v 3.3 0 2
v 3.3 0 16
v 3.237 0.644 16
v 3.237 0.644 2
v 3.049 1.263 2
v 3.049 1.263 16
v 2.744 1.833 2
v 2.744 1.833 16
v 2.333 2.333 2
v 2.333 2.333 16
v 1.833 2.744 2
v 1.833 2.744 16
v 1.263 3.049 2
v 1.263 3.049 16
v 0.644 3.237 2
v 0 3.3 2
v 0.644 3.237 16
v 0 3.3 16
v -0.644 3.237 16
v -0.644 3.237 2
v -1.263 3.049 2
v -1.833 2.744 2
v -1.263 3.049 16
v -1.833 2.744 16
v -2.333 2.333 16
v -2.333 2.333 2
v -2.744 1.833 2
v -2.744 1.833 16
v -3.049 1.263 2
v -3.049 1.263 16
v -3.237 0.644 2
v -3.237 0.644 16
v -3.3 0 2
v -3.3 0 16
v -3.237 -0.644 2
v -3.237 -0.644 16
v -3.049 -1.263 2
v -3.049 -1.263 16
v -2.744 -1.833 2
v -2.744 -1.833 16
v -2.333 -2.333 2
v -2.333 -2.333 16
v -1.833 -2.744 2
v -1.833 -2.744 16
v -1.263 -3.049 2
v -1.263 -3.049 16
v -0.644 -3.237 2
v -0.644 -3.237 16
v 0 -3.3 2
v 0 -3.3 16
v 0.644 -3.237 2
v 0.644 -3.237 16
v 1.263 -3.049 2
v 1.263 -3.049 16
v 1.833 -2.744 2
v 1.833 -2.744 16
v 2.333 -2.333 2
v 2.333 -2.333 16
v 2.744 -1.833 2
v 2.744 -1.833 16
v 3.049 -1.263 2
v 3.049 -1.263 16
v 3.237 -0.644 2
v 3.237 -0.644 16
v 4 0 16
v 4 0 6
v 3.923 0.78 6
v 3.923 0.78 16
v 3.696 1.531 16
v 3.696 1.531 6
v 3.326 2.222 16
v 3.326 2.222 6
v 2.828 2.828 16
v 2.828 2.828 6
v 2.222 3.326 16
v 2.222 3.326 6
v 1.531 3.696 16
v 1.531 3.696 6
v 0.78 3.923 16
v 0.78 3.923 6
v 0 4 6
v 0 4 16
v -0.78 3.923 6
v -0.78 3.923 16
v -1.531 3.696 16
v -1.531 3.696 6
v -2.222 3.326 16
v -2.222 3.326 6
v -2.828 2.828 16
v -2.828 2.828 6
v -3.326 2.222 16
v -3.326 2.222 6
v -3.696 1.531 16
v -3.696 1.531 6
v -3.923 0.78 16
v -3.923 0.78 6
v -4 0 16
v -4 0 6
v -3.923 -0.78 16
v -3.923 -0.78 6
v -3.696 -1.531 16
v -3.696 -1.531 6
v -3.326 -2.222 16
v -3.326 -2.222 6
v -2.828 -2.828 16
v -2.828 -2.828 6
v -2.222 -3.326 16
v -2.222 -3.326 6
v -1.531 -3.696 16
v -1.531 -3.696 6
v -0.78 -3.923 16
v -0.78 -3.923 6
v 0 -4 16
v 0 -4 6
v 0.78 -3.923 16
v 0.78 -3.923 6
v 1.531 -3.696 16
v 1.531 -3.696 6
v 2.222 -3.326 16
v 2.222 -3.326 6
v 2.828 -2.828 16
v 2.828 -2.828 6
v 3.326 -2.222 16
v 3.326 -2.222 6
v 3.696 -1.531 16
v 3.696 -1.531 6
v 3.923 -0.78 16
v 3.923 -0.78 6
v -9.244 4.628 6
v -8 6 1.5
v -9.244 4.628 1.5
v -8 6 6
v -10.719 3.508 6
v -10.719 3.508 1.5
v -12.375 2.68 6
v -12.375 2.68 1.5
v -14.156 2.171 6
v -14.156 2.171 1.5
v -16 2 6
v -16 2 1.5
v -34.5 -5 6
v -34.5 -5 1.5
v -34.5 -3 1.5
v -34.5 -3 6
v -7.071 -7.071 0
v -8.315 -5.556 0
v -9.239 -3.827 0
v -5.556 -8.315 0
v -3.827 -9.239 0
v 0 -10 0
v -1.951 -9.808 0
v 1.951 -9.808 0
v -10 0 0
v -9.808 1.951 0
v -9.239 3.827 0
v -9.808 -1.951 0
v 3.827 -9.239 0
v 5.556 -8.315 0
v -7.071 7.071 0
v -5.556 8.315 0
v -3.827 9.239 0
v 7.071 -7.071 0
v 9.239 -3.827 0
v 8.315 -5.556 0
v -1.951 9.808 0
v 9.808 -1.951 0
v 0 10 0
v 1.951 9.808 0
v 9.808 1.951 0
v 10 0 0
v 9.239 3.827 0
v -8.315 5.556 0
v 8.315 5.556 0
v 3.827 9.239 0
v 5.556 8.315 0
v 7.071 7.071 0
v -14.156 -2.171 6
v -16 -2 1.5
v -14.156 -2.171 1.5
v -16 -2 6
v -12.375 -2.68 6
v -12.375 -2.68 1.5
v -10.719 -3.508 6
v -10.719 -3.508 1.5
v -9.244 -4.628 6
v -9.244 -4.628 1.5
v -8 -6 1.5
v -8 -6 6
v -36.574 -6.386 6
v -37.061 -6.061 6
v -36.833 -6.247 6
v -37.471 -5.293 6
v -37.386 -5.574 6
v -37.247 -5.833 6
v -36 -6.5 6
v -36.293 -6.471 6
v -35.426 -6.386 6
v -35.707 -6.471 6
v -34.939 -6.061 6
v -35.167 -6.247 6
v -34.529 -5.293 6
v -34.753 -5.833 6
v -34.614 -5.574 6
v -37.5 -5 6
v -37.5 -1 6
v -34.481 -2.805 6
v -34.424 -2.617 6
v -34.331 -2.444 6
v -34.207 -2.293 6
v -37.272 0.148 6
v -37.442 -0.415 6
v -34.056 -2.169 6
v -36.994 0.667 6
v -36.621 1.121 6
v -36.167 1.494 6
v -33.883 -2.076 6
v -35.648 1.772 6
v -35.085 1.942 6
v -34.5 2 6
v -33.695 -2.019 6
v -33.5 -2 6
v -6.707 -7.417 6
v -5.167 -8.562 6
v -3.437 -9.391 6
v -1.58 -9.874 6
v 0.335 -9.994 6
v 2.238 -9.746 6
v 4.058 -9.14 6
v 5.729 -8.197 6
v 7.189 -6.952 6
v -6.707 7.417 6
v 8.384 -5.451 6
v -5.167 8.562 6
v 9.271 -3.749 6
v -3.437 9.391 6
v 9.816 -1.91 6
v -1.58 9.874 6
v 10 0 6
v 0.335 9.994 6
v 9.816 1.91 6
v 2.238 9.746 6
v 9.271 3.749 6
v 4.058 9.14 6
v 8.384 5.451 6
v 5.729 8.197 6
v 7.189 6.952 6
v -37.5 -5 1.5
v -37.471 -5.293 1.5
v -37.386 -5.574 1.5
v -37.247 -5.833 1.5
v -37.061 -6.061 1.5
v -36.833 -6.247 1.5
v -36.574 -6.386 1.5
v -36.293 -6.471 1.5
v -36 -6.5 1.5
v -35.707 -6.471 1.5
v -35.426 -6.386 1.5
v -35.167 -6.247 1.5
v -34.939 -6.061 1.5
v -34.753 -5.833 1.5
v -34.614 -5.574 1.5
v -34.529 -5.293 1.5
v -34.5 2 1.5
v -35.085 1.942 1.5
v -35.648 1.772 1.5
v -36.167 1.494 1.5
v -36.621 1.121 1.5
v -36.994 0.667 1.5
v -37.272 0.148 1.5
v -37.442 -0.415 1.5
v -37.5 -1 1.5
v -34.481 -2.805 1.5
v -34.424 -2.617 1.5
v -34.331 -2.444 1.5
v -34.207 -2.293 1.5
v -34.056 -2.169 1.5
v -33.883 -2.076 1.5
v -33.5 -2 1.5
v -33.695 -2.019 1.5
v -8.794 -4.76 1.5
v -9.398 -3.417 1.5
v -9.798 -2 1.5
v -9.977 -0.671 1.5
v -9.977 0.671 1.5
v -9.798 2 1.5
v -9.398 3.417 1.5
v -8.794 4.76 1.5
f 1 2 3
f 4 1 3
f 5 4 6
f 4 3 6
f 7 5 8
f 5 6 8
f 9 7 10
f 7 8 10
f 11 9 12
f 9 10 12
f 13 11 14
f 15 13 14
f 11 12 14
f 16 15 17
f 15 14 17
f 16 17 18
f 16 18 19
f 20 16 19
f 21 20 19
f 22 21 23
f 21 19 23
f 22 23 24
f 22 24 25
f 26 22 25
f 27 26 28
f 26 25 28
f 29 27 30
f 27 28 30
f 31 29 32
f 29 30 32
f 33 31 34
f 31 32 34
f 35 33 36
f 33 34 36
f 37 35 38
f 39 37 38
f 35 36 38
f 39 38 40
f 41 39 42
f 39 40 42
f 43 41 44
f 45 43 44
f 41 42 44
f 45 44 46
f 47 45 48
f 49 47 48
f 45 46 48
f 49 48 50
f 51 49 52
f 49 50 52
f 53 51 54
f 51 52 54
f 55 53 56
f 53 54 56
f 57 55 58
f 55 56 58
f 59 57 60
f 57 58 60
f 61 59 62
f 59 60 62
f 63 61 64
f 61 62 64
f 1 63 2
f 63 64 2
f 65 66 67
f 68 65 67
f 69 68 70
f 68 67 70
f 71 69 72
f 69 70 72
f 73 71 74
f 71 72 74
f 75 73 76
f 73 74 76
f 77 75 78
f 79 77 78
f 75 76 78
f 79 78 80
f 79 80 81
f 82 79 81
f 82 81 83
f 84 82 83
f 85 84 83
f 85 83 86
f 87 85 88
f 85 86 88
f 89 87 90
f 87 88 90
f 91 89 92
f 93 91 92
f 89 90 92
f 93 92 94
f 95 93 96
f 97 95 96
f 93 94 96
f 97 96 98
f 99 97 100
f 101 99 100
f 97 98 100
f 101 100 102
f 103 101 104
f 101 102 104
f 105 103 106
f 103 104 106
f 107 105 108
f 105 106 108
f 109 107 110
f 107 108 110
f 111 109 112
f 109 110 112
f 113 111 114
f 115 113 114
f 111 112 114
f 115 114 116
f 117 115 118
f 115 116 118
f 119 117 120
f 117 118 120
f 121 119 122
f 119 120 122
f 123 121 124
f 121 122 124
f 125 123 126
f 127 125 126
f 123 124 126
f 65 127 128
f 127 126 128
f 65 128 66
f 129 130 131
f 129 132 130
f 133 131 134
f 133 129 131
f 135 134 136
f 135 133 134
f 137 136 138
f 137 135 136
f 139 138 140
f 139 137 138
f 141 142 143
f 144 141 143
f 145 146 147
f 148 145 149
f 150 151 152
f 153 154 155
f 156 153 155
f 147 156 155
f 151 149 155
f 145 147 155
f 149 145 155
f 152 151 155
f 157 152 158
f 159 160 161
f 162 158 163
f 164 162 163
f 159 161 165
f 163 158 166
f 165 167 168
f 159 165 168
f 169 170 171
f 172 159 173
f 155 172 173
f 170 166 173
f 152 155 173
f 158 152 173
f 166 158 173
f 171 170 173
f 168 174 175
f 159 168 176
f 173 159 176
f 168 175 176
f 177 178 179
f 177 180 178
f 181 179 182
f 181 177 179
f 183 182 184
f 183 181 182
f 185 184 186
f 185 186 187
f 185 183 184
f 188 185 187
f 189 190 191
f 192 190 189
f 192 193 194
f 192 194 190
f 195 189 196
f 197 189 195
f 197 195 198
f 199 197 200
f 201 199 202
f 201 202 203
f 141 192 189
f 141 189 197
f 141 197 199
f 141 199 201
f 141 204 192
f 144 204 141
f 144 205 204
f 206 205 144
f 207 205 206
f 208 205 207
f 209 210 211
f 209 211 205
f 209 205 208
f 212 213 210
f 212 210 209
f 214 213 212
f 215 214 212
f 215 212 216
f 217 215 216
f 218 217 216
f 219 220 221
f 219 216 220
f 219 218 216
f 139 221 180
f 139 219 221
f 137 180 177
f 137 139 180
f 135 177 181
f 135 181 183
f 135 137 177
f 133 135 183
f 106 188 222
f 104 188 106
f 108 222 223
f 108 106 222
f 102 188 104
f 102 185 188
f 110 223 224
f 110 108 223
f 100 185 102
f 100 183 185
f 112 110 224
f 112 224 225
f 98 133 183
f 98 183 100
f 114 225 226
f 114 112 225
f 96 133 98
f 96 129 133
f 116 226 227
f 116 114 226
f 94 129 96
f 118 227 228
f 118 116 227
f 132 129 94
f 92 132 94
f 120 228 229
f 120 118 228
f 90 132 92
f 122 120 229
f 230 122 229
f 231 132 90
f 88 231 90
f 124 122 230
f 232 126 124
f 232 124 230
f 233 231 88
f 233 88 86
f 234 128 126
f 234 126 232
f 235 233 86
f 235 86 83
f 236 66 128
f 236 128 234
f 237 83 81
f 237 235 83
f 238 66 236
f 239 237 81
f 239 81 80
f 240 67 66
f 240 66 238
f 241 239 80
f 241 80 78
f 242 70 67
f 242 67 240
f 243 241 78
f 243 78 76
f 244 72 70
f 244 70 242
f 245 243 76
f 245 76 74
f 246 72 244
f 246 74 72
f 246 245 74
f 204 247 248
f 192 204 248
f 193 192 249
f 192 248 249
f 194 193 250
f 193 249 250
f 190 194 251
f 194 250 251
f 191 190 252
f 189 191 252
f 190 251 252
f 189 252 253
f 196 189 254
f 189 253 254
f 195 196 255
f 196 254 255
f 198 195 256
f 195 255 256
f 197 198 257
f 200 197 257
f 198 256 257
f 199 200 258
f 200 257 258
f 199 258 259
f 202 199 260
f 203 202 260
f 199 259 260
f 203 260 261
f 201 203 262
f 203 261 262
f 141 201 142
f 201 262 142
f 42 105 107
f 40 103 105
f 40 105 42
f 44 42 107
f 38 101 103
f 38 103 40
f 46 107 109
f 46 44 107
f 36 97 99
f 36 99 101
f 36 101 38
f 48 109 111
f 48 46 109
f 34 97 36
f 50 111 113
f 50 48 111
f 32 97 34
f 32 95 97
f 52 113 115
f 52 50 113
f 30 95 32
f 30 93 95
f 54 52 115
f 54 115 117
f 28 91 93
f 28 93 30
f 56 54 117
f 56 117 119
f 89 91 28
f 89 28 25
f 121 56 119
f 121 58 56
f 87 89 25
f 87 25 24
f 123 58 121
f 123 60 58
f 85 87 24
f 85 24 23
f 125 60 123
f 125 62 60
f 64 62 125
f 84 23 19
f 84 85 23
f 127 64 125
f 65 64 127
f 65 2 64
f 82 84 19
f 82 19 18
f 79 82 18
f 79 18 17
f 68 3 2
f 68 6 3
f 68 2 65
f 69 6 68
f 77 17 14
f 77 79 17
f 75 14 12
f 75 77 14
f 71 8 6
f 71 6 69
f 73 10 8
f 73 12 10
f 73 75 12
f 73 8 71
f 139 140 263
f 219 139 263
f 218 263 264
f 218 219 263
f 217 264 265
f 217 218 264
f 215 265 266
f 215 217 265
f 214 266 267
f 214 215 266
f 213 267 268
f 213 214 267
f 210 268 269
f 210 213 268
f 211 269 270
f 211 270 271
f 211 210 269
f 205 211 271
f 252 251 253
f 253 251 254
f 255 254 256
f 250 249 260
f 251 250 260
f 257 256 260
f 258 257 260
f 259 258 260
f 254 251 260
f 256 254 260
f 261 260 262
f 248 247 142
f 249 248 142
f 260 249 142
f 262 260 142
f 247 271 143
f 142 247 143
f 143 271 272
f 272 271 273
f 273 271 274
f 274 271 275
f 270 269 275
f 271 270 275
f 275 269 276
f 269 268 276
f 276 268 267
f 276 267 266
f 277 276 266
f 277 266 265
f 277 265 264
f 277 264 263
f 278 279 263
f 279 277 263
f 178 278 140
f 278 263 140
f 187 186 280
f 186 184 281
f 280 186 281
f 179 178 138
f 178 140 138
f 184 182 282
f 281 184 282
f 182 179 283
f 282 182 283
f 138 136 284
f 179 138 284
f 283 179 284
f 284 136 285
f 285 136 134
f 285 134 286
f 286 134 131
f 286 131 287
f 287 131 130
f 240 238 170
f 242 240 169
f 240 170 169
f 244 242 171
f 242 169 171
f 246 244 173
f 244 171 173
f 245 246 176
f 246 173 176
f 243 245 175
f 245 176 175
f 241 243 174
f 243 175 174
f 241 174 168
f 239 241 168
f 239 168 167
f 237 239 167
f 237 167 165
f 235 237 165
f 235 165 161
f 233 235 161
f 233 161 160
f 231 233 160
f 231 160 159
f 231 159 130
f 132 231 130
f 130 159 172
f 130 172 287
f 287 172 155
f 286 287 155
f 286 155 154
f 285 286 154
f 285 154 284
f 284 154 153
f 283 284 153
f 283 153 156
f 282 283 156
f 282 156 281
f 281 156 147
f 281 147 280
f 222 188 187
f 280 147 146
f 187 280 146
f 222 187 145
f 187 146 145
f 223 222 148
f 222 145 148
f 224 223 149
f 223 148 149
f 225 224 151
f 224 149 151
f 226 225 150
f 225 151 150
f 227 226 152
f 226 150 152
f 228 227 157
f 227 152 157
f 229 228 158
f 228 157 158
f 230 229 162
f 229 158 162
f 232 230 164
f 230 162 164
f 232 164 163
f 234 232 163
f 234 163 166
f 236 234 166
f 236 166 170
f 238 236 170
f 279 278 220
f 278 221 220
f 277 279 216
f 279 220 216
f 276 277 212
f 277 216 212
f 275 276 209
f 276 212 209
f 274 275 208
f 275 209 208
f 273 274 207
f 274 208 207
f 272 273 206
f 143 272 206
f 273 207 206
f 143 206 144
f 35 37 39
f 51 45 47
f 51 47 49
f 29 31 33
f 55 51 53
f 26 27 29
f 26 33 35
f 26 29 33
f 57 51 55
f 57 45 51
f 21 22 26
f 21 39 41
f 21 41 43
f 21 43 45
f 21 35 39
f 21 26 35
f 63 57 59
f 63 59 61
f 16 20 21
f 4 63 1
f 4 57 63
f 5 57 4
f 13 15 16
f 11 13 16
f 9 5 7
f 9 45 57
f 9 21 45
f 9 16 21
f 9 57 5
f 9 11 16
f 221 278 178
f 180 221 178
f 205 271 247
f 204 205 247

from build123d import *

# Parameters (mm, degrees)
ESBO_O1_R                = 10
RESSALTO_EXTRUS_O1_DEPTH = 6
RESSALTO_EXTRUS_O2_START = -4.5
RESSALTO_EXTRUS_O2_DEPTH = 4.5
FILETE1_R                = 3
FILETE2_R                = 1
FILETE3_R                = 10
ESBO_O3_R                = 4
RESSALTO_EXTRUS_O3_DEPTH = 10
ESBO_O4_R                = 3.3
CORTE_EXTRUS_O1_DEPTH    = 14


with BuildPart() as part:
    # Esboço1 → Ressalto-extrusão1 (new body)
    with BuildSketch(Plane.XY):
        Circle(ESBO_O1_R)
    extrude(amount=RESSALTO_EXTRUS_O1_DEPTH)

    # Esboço2 → Ressalto-extrusão2 (add)
    with BuildSketch(Plane.XY.offset(6).offset(RESSALTO_EXTRUS_O2_START)):
        with BuildLine():
            Line((-9.797958971, 2), (-37.5, 2))
            Line((-37.5, 2), (-37.5, -5))
            ThreePointArc((-37.5, -5), (-36, -6.5), (-34.5, -5))
            Line((-34.5, -5), (-34.5, -2))
            Line((-34.5, -2), (-9.797958971, -2))
            ThreePointArc((-9.797958971, -2), (-10, 0), (-9.797958971, 2))
        make_face()
    extrude(amount=RESSALTO_EXTRUS_O2_DEPTH)

    # Filete1
    filete1_edges = [part.edges().sort_by_distance(p)[0] for p in [
        (-37.5, 2, 3.75),
    ]]
    fillet(filete1_edges, radius=FILETE1_R)

    # Filete2
    filete2_edges = [part.edges().sort_by_distance(p)[0] for p in [
        (-34.5, -2, 3.75),
    ]]
    fillet(filete2_edges, radius=FILETE2_R)

    # Filete3
    filete3_edges = [part.edges().sort_by_distance(p)[0] for p in [
        (-9.797958971, 2, 3.75),
        (-9.797958971, -2, 3.75),
    ]]
    fillet(filete3_edges, radius=FILETE3_R)

    # Esboço3 → Ressalto-extrusão3 (add)
    with BuildSketch(Plane.XY.offset(6)):
        Circle(ESBO_O3_R)
    extrude(amount=RESSALTO_EXTRUS_O3_DEPTH)

    # Esboço4 → Corte-extrusão1 (cut)
    with BuildSketch(Plane.XY.offset(16)):
        Circle(ESBO_O4_R)
    extrude(amount=-CORTE_EXTRUS_O1_DEPTH, mode=Mode.SUBTRACT)


solid = part.part
